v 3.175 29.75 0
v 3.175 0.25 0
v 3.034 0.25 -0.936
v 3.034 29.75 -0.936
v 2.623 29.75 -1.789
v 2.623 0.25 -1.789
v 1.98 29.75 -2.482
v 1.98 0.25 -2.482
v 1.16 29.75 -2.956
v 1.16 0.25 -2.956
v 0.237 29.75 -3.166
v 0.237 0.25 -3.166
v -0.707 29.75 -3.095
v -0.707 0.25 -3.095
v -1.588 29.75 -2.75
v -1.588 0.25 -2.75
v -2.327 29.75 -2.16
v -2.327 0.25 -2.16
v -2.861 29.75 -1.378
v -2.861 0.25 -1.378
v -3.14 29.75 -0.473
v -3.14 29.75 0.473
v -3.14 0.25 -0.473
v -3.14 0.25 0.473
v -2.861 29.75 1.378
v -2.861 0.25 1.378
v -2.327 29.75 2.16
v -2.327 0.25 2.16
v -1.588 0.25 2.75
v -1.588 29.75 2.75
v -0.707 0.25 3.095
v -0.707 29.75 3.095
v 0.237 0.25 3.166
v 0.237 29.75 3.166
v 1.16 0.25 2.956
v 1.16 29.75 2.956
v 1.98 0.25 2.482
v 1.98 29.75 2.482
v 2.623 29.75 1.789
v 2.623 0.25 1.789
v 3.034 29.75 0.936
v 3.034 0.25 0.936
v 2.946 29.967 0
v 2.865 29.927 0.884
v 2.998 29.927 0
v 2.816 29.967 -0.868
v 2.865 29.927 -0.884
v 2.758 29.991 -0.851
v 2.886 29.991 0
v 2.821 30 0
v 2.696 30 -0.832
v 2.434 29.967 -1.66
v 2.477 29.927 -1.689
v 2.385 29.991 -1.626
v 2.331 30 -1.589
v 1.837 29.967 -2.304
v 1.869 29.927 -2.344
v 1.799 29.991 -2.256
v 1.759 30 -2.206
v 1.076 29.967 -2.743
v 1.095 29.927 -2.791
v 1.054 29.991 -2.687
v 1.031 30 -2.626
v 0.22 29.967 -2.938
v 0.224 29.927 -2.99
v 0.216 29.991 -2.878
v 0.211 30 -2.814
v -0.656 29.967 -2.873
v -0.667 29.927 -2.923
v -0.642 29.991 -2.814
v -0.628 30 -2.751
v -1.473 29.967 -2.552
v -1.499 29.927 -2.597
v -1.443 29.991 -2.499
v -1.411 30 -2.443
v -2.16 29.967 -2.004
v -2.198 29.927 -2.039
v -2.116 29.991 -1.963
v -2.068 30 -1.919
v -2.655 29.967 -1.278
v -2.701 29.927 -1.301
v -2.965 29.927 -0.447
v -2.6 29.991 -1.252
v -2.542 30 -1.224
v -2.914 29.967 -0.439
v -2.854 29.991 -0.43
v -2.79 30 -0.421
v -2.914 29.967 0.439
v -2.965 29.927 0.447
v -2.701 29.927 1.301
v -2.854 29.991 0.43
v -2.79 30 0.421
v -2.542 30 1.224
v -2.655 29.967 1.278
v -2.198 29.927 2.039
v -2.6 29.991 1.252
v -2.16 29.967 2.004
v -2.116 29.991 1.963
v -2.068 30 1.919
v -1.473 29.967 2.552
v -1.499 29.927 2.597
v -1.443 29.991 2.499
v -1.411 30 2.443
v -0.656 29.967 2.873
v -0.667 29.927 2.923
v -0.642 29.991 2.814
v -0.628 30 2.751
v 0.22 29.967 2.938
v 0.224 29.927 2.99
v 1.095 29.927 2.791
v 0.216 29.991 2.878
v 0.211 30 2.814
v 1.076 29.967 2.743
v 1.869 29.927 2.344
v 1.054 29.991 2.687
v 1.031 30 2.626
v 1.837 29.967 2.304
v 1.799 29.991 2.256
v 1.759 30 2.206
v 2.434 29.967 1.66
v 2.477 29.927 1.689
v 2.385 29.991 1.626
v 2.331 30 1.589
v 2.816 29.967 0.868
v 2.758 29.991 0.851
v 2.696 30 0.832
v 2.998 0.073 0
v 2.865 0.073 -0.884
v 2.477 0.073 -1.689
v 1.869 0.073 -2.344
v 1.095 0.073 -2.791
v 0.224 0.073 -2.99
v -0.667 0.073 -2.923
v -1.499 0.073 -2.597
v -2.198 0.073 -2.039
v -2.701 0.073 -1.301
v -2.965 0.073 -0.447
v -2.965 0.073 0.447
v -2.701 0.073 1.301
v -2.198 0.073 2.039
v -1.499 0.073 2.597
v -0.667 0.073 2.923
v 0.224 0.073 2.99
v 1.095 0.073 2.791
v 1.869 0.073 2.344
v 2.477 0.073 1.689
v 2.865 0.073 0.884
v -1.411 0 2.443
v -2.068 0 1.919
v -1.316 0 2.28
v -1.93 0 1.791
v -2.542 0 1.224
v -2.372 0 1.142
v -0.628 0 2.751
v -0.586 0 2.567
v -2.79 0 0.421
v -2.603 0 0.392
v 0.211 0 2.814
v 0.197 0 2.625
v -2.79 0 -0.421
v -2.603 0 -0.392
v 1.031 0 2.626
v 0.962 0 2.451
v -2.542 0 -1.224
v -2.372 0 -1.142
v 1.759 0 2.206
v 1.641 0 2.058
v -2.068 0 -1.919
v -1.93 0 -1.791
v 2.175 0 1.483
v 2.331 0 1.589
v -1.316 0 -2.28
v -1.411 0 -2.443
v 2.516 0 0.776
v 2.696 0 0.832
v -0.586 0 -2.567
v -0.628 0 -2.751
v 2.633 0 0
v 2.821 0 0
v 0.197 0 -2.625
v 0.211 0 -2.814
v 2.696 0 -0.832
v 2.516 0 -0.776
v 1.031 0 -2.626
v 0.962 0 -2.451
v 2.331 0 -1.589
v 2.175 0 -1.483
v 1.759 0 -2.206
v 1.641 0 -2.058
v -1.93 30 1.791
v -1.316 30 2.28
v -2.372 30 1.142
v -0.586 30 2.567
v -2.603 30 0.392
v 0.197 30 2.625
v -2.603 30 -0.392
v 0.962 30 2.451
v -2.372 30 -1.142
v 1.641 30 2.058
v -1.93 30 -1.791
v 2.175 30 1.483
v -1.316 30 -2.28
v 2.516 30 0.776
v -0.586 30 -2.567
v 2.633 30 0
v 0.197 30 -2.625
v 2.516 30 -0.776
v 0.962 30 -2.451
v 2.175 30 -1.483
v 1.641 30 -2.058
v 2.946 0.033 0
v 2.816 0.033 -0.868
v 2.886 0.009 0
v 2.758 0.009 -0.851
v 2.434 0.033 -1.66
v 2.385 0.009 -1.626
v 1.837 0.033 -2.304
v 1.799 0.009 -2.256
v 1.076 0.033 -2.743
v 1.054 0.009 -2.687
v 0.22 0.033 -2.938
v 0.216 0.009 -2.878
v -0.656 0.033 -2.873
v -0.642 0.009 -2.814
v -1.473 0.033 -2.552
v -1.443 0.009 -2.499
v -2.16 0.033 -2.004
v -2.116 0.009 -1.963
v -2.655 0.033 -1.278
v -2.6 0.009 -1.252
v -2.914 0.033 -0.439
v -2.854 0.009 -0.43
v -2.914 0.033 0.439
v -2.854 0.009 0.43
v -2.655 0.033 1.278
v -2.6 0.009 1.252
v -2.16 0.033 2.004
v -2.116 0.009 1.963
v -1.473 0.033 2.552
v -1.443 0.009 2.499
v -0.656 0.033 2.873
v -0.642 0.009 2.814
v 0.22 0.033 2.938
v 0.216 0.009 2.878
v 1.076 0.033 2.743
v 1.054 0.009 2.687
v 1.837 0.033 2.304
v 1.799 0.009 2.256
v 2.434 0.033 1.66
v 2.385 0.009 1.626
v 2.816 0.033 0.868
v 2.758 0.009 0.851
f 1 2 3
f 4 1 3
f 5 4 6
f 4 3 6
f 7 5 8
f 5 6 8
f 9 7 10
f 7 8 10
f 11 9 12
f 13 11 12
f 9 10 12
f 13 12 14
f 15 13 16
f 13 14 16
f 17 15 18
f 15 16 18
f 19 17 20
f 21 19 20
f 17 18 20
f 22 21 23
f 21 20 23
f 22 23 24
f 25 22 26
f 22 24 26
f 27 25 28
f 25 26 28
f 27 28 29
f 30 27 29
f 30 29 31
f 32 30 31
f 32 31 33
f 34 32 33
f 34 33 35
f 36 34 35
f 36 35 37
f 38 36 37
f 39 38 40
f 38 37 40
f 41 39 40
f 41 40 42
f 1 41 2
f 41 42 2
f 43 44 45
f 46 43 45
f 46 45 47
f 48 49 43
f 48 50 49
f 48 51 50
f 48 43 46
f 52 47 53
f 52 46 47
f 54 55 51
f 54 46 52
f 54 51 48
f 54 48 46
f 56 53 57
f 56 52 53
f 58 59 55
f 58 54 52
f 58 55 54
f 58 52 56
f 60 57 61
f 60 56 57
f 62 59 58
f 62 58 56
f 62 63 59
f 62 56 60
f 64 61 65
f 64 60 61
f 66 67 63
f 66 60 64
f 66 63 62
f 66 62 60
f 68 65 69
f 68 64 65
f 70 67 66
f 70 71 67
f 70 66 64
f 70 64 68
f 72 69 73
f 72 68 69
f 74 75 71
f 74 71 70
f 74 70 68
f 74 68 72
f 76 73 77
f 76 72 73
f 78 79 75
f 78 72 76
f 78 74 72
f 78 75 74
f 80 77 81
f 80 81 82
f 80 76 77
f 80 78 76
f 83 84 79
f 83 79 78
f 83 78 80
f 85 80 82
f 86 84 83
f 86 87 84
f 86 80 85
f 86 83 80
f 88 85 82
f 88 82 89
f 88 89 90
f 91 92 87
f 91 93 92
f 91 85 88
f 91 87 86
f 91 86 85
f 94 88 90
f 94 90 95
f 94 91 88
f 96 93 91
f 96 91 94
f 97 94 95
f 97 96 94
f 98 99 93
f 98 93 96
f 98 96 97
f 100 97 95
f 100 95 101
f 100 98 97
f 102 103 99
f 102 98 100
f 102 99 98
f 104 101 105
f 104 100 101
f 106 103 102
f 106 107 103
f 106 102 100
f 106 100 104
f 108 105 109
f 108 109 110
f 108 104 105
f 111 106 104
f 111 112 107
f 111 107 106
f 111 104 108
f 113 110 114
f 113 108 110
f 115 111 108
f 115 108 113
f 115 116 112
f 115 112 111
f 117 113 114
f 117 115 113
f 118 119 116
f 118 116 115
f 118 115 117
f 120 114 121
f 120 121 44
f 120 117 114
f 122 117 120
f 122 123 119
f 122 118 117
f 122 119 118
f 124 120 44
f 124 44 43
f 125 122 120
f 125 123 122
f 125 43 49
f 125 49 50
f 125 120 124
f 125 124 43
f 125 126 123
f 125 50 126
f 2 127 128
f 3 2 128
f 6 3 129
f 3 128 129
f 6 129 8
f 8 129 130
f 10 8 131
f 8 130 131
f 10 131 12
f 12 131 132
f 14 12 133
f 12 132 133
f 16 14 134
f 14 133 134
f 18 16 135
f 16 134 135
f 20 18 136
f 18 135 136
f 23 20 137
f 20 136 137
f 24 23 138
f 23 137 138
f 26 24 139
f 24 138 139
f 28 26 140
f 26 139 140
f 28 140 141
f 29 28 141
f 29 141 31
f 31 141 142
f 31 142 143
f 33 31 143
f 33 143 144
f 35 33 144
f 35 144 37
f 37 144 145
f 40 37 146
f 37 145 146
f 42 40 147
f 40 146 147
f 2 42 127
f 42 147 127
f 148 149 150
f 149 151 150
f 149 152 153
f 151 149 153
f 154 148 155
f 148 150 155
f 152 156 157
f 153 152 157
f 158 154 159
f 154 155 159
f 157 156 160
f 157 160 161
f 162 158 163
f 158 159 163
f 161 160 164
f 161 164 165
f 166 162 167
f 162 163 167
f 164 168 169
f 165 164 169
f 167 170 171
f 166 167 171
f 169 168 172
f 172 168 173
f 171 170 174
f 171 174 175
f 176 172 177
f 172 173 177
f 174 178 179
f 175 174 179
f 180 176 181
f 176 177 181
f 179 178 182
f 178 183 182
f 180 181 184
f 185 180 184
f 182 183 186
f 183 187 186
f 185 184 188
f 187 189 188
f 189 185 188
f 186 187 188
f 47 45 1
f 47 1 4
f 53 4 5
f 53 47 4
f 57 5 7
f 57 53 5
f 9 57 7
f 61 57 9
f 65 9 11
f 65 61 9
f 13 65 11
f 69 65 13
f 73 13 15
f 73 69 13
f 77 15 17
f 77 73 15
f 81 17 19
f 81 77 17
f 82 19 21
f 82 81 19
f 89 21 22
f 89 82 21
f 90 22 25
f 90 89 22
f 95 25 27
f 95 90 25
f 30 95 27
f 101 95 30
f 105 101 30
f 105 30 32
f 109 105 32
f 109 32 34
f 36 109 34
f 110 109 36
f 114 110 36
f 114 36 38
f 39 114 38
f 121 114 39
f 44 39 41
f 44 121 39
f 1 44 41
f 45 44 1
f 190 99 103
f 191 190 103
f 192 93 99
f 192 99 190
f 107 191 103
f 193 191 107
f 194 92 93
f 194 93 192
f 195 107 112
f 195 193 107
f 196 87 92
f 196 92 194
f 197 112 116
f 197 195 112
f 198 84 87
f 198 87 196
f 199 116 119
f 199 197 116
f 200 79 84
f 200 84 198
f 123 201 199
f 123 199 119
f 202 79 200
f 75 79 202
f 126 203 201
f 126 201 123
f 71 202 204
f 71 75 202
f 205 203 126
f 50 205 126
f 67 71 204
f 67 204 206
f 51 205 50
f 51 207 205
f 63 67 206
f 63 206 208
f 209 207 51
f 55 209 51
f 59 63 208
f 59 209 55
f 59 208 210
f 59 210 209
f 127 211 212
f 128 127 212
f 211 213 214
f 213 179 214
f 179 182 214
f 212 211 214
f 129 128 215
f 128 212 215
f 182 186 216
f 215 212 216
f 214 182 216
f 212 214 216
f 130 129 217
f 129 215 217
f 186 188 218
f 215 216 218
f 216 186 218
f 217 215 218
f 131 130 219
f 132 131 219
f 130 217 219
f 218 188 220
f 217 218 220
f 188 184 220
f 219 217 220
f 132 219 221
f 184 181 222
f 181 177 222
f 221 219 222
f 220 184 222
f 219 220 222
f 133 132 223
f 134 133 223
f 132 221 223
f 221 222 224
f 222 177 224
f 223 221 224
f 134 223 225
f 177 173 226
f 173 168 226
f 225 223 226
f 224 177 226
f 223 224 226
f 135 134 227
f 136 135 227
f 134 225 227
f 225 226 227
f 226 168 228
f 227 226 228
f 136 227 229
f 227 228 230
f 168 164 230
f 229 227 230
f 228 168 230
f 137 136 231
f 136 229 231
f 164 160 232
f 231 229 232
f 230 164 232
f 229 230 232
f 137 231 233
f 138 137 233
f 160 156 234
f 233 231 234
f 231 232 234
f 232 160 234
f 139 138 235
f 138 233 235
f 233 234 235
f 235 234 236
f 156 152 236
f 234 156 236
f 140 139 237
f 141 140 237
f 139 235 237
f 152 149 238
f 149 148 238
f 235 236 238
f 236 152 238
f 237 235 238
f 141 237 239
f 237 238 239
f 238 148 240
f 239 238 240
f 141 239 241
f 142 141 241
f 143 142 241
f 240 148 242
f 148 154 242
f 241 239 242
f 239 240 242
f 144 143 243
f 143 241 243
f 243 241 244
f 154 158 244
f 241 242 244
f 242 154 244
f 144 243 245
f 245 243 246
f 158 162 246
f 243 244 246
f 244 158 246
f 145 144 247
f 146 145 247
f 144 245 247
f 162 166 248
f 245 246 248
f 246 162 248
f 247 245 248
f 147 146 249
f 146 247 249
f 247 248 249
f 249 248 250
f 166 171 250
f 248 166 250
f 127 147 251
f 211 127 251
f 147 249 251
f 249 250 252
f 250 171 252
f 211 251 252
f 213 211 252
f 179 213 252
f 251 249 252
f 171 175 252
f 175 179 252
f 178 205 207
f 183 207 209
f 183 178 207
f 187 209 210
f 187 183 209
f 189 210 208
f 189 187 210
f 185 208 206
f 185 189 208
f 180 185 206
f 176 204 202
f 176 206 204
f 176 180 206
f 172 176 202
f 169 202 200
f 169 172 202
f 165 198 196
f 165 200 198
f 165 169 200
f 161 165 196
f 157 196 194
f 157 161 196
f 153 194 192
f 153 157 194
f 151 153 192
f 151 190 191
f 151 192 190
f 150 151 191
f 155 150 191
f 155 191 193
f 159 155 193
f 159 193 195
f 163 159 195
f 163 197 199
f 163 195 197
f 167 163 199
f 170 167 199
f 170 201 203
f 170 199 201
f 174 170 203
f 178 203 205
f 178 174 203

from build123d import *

# Parameters (mm, degrees)
SKETCH1_R           = 3.175
BOSS_EXTRUDE2_DEPTH = 30
CHAMFER1_SIZE       = 0.25
CHAMFER2_SIZE       = 0.25
SKETCH10_R          = 2.632684592
CUT_EXTRUDE2_DEPTH  = 34
FILLET2_R           = 0.25
FILLET3_R           = 0.25


with BuildPart() as part:
    # Sketch1 → Boss-Extrude2 (new body)
    with BuildSketch(Plane(origin=(0, 0, 0), x_dir=(1, 0, 0), z_dir=(0, 1, 0))):
        Circle(SKETCH1_R)
    extrude(amount=BOSS_EXTRUDE2_DEPTH)

    # Chamfer1
    chamfer1_edges = [part.edges().sort_by_distance(p)[0] for p in [
        (-3.175, 30, 0),
    ]]
    chamfer(chamfer1_edges, length=CHAMFER1_SIZE)

    # Chamfer2
    chamfer2_edges = [part.edges().sort_by_distance(p)[0] for p in [
        (-3.175, 0, 0),
    ]]
    chamfer(chamfer2_edges, length=CHAMFER2_SIZE)

    # Sketch10 → Cut-Extrude2 (cut)
    with BuildSketch(Plane(origin=(0, 0, 0), x_dir=(1, 0, 0), z_dir=(0, 1, 0))):
        Circle(SKETCH10_R)
    extrude(amount=CUT_EXTRUDE2_DEPTH, mode=Mode.SUBTRACT)

    # Fillet2
    fillet2_edges = [part.edges().sort_by_distance(p)[0] for p in [
        (-2.925, 30, 0),
    ]]
    fillet(fillet2_edges, radius=FILLET2_R)

    # Fillet3
    fillet3_edges = [part.edges().sort_by_distance(p)[0] for p in [
        (-2.925, 0, 0),
    ]]
    fillet(fillet3_edges, radius=FILLET3_R)


solid = part.part
